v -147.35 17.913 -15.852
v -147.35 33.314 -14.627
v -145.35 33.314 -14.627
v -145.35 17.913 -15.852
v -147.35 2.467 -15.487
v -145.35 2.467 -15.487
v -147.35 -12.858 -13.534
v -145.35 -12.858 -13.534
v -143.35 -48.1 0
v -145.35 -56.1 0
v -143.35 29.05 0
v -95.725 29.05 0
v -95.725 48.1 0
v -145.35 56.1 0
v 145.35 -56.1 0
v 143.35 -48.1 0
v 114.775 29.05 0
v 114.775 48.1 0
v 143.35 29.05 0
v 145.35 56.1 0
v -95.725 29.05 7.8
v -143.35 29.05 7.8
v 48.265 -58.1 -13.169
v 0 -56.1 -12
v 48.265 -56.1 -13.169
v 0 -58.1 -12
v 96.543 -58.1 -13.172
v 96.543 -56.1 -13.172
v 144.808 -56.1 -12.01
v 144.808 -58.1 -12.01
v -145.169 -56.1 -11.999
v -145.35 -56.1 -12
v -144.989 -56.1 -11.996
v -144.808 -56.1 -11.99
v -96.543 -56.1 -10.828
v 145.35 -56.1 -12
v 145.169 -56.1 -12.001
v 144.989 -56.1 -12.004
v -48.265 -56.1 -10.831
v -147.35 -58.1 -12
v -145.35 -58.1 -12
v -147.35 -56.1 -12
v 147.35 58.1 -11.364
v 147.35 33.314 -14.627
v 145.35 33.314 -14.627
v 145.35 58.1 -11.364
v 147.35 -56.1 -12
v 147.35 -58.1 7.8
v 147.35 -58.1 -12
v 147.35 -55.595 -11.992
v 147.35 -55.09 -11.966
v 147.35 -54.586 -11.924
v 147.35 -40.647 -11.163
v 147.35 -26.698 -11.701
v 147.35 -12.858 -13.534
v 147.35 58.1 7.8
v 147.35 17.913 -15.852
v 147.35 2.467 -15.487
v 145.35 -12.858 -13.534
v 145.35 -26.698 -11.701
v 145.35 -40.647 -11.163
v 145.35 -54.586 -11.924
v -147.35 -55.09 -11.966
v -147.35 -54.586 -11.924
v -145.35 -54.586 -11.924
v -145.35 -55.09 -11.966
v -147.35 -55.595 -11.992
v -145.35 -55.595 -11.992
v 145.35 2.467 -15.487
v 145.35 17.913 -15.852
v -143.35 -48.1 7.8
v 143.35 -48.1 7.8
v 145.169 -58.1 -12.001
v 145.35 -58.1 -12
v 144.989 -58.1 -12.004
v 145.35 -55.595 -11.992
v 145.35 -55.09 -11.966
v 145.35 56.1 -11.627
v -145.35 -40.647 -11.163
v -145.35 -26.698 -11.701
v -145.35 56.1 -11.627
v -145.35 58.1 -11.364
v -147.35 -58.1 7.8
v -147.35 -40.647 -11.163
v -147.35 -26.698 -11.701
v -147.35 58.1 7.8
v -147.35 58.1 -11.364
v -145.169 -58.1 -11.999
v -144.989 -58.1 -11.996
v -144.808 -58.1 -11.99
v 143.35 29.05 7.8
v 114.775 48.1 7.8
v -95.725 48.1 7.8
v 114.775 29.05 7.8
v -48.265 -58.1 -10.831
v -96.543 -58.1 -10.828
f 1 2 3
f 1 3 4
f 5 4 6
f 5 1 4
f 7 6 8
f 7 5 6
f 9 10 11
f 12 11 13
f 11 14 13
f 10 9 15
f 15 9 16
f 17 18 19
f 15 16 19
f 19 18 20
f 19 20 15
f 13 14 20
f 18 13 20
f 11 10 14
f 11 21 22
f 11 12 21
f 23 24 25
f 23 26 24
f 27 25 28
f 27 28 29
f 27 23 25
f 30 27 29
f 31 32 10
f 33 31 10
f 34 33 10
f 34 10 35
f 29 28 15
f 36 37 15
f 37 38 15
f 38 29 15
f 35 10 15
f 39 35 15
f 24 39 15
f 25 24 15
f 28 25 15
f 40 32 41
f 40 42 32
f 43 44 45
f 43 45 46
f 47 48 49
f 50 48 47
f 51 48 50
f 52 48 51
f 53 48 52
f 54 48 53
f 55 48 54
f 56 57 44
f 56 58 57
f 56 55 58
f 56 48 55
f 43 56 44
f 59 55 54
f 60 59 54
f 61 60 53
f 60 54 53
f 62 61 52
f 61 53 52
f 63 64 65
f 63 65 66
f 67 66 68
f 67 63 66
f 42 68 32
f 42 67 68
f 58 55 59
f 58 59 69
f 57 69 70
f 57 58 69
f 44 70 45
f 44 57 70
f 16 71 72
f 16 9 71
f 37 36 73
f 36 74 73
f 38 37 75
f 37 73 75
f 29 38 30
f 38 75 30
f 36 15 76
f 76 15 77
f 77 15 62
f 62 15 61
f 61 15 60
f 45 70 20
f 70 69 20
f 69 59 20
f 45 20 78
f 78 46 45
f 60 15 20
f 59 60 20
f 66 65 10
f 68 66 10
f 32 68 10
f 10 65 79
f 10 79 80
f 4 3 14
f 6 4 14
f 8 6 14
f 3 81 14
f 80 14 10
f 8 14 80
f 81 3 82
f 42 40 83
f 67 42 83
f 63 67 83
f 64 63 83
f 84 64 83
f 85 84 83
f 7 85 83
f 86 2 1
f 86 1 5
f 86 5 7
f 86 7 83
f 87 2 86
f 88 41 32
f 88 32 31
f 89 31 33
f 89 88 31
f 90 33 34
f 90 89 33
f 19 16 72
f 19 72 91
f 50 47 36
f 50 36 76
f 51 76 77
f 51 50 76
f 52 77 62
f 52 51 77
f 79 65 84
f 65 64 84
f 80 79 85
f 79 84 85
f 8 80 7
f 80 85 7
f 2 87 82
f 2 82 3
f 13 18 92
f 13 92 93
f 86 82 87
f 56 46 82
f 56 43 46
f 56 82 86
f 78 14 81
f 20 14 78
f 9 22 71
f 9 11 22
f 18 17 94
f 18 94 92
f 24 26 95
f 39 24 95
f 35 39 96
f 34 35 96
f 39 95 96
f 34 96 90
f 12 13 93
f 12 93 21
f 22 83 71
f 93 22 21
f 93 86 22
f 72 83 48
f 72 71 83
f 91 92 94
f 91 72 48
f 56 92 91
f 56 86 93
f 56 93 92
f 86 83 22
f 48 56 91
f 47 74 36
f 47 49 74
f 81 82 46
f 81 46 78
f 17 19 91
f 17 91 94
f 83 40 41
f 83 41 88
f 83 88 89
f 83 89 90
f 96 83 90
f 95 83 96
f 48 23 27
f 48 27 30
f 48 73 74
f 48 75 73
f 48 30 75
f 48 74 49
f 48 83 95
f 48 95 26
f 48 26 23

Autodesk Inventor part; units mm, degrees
ref_plane "YZ Plane" through (0, 0, 0) normal (1, 0, 0) x (0, 1, 0)
ref_plane "XZ Plane" through (0, 0, 0) normal (0, 1, 0) x (-1, 0, 0)
ref_plane "Work Plane1" through (0, 0, 0) normal (0, 0, 1) x (1, 0, 0)
sketch "Sketch1" plane through (0, 0, 0) normal (0, 0, 1) x (1, 0, 0)
  line L0 (143.35, -48.1) -> (143.35, 29.05)
  line L1 (143.35, 29.05) -> (114.775, 29.05)
  line L2 (114.775, 29.05) -> (114.775, 48.1)
  line L3 (114.775, 48.1) -> (-95.725, 48.1)
  line L4 (-95.725, 48.1) -> (-95.725, 29.05)
  line L5 (-95.725, 29.05) -> (-143.35, 29.05)
  line L6 (-143.35, 29.05) -> (-143.35, -48.1)
  line L7 (-143.35, -48.1) -> (143.35, -48.1)
  line L8 (147.35, -58.1) -> (-147.35, -58.1)
  line L9 (-147.35, -58.1) -> (-147.35, 58.1)
  line L10 (-147.35, 58.1) -> (147.35, 58.1)
  line L11 (147.35, 58.1) -> (147.35, -58.1)
  line L12 (140.35, -31.6) -> (140.35, -44.6)
  line L13 (139.85, -45.1) -> (126.85, -45.1)
  line L14 (-140.35, -44.6) -> (-140.35, -31.6)
  line L15 (-92.725, 31.6) -> (-92.725, 44.6)
  line L16 (111.775, 44.6) -> (111.775, 31.6)
  line L17 (98.275, 45.1) -> (111.275, 45.1)
  line L18 (114.9437, 26.05) -> (127.9437, 26.05)
  point P0 (0, 0)
extrude "Extrusion1" add sketch "Sketch1" along normal blind 7.8
sketch "Sketch2" plane through (-147.35, -58.1, 0) normal (-1, 0, 0) x (0, 0, 1)
  line L0 (0, 116.2) -> (0, 0) projected
  line L1 (0, 116.2) -> (-11.364, 116.2)
  line L2 (0, 116.2) -> (7.8, 116.2) projected
  line L3 (-11.364, 116.2) -> (-14.6271, 91.4139)
  arc A0 (-14.6271, 91.4139) -> (-13.5342, 45.2415) centre (134.0896, 71.8349) ccw
  arc A1 (-11.9235, 3.5135) -> (-13.5342, 45.2415) centre (-161.158, 18.648) ccw
  arc A2 (-11.9235, 3.5135) -> (-12, 2) centre (3, 2) ccw
  line L4 (-12, 2) -> (-12, 0)
  line L5 (0, 0) -> (-12, 0)
  line L6 (0, 0) -> (7.8, 0) projected
  line L7 (-11.364, 116.2) -> (-11.0375, 118.68) construction
  line L8 (7.8, 116.2) -> (-11.0375, 118.68) construction
  point P0 (0, 58.1)
  dimension "d14" = 97.5
  dimension "d15" = 25
  dimension "d16" = 150
  dimension "d17" = 150
  dimension "d18" = 2
  dimension "d19" = 15
  dimension "d22" = 12
  dimension "d34" = 19
  dimension "d35" = 19.1639
extrude "Extrusion2" add sketch "Sketch2" against normal blind 2
mirror "Mirror1" about plane through (0, 0, 0) normal (1, 0, 0) of "Extrusion2"
sketch "Sketch3" plane through (0, 0, 0) normal (0, 0, -1) x (-1, 0, 0)
  line L0 (-145.35, 58.1) -> (145.35, 58.1) projected
  line L1 (145.35, -58.1) -> (-145.35, -58.1) projected
  line L2 (145.35, -58.1) -> (145.35, 58.1) projected
  line L3 (-145.35, 58.1) -> (-145.35, -58.1) projected
  line L4 (145.35, 56.1) -> (-145.35, 56.1)
  line L5 (145.35, -56.1) -> (-145.35, -56.1)
  point P0 (0, 0)
  dimension "d25" = 2
  dimension "d26" = 2
extrude "Extrusion3" add sketch "Sketch3" along normal up to surface contours L0 L2 L4 L3 surface through (-147.35, 33.3139, -14.6271) normal (0, 0.1305, -0.9914)
sketch "Sketch4" plane through (-147.35, -58.1, 7.8) normal (0, -1, 0) x (1, 0, 0)
  line L0 (2, -7.8) -> (2, -19.8) projected
  line L1 (2, -7.8) -> (292.7, -7.8) projected
  line L2 (292.7, -7.8) -> (292.7, -19.8) projected
  line L3 (0, -19.8) -> (2, -19.8) projected
  line L4 (294.7, -19.8) -> (292.7, -19.8) projected
  arc A0 (2, -19.8) -> (2.542, -19.7902) centre (2, -4.8) ccw
  arc A1 (147.35, -19.8) -> (2.542, -19.7902) centre (74.8108, -2018.4841) ccw
  arc A2 (147.35, -19.8) -> (292.158, -19.8098) centre (219.8892, 1978.8841) ccw
  arc A3 (292.7, -19.8) -> (292.158, -19.8098) centre (292.7, -34.8) ccw
  point P0 (147.35, -7.8)
  point P1 (147.35, -7.8)
  dimension "d29" = 15
  dimension "d30" = 2000
  dimension "d36" = 2000
extrude "Extrusion4" add sketch "Sketch4" against normal blind 2
properties part number "top"
